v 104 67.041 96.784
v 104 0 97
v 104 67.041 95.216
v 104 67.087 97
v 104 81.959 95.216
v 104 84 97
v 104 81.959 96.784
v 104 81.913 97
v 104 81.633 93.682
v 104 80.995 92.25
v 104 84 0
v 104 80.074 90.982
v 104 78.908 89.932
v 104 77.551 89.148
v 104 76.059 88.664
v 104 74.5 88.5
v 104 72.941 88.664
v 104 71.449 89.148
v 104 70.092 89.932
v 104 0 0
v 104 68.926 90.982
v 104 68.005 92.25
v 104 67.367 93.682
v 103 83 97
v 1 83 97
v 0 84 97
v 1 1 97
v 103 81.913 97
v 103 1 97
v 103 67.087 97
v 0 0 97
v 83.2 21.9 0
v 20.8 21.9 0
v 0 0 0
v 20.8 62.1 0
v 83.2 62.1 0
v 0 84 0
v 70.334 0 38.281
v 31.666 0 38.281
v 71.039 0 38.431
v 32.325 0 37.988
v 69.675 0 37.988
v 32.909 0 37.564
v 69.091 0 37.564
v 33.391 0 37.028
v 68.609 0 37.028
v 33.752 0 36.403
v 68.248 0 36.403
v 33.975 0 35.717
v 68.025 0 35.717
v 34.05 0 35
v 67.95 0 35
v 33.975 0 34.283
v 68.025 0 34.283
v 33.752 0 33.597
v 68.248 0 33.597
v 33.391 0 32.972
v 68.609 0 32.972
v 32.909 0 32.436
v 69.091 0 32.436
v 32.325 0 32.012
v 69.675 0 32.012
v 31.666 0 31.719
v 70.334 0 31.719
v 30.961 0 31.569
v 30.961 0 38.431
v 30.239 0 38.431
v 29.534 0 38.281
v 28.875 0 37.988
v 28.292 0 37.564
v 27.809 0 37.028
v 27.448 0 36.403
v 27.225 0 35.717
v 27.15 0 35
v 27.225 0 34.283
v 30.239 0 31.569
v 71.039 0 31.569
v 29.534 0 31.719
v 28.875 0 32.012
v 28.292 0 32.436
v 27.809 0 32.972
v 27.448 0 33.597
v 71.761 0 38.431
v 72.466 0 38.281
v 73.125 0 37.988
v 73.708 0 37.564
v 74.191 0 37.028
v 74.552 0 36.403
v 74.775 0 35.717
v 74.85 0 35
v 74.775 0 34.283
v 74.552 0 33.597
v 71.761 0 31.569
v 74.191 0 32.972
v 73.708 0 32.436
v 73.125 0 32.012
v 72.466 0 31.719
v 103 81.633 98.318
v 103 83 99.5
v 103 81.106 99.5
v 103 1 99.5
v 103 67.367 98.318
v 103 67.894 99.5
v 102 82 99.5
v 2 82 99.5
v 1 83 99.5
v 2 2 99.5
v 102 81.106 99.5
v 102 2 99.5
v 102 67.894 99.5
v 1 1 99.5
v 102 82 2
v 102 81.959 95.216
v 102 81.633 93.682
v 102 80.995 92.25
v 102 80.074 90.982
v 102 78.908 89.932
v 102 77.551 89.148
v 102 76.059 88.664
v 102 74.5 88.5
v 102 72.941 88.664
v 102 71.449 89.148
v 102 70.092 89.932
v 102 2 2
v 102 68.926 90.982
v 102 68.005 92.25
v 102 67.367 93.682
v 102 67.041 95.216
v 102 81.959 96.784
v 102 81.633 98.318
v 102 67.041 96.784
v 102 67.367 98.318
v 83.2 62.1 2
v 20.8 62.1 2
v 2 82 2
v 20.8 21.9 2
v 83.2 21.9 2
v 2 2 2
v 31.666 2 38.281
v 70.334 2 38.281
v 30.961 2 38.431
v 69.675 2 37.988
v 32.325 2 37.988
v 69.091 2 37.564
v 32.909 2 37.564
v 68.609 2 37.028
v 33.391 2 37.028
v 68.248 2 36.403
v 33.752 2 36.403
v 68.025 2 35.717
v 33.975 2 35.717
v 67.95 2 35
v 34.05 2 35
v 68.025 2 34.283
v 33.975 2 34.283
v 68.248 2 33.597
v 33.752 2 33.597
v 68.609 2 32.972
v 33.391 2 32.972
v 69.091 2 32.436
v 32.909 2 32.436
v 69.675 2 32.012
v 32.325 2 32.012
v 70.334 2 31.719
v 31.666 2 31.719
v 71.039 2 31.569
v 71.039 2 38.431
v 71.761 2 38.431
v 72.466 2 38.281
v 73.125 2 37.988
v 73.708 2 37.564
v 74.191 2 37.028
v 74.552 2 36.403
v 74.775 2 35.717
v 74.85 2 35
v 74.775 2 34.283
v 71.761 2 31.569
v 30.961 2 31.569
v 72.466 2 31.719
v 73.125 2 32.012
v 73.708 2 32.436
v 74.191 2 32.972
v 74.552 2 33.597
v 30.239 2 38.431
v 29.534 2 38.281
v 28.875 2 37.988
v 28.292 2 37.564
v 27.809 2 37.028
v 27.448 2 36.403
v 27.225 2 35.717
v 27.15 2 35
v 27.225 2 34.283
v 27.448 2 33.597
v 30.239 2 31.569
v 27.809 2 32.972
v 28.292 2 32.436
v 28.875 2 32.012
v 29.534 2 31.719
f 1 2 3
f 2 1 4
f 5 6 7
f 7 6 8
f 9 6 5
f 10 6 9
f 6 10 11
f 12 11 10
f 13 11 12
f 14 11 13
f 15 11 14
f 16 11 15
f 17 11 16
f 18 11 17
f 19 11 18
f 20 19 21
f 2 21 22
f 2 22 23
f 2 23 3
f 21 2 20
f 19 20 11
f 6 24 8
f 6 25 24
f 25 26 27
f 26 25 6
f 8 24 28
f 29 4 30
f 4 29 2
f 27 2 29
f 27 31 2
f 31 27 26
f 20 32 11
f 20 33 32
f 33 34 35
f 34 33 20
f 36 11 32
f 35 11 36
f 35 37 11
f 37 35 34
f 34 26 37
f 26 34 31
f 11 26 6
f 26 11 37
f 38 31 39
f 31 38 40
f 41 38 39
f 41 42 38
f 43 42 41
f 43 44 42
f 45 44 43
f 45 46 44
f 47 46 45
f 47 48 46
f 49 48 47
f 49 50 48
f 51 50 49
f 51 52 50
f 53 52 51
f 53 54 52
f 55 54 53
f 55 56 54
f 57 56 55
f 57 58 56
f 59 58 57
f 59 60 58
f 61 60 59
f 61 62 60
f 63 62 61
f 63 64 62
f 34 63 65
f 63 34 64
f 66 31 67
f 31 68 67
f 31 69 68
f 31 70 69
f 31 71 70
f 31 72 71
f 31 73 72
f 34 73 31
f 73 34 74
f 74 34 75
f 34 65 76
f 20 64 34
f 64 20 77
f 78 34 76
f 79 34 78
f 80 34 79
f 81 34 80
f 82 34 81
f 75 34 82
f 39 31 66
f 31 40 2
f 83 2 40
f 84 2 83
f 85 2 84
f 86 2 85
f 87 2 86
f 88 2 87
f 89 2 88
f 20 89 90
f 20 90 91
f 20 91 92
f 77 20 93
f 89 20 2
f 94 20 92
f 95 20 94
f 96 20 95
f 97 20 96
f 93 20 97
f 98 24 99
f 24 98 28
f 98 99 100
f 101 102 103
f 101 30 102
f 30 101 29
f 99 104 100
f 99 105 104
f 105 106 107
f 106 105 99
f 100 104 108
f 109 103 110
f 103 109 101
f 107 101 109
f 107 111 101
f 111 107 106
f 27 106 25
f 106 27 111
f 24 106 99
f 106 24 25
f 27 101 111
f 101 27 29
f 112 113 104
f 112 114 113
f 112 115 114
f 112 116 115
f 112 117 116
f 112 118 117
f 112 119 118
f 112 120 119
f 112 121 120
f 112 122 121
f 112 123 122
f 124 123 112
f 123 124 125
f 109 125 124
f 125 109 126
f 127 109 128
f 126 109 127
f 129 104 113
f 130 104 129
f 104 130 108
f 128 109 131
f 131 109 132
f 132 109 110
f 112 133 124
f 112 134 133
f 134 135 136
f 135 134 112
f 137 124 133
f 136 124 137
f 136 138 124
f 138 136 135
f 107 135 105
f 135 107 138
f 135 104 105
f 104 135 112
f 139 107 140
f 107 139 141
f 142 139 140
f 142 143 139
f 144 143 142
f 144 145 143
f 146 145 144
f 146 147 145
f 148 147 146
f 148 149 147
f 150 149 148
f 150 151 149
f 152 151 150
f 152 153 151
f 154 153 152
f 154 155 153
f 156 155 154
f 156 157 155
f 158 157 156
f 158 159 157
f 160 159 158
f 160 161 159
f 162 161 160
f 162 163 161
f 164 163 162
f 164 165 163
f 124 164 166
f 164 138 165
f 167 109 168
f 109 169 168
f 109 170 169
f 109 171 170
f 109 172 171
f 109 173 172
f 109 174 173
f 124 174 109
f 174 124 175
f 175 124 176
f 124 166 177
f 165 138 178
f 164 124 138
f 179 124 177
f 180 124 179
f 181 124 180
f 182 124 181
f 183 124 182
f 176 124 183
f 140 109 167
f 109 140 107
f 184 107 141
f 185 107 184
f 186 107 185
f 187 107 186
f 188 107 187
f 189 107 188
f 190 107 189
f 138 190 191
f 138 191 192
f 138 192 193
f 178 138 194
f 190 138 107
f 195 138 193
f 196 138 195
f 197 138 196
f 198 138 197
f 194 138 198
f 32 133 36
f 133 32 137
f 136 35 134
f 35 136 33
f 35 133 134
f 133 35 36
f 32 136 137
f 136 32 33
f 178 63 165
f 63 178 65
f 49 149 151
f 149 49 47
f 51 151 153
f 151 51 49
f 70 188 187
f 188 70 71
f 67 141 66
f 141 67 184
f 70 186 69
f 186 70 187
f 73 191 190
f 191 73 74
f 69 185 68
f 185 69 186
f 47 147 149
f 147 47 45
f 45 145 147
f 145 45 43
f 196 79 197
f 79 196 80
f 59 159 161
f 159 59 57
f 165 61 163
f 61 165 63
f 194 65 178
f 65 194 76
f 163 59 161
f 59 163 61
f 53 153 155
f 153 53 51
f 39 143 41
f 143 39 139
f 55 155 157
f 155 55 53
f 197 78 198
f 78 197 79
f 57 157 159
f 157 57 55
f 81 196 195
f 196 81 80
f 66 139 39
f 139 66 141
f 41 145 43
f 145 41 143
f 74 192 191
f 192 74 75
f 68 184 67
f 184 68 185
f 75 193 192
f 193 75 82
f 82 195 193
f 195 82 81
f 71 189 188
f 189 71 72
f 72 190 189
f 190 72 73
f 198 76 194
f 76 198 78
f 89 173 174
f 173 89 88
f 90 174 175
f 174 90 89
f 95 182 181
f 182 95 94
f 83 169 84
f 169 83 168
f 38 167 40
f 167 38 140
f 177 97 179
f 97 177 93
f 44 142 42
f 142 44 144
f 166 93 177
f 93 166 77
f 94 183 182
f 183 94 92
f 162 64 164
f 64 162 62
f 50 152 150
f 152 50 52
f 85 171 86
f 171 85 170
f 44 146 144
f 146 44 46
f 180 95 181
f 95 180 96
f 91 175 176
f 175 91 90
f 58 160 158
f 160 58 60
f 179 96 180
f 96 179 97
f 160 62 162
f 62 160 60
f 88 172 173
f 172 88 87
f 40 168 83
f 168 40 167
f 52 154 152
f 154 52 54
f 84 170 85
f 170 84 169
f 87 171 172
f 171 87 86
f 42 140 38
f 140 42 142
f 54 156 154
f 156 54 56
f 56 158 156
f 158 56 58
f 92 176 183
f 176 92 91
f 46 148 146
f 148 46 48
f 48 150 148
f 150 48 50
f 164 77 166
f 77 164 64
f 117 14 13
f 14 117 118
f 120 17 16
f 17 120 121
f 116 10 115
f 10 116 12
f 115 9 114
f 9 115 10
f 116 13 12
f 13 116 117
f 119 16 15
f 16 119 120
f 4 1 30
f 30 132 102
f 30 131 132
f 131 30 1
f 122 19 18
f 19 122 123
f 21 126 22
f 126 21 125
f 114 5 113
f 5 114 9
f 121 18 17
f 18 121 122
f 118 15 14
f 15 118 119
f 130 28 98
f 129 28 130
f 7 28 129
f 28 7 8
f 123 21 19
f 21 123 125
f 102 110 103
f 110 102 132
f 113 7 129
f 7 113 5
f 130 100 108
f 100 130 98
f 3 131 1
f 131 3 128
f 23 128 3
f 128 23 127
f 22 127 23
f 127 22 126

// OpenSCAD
wallthickness = 1; // this is the wall of the lip, the box is twice as thick
internalx = 100; // internal x dimension
internaly = 80; // internal y dimension
internalz = 100; // internal overall z dimension
internal_lidz=5; // this is taken of off the internalz for the bottom height and acts as the lid internal height
led_x = 62.4;
led_y = 40.2;
cable_hole = 6;
rotary_hole = 6.9/2;

lip_overlap = internal_lidz/2; // how much overlap between box and lid, this works as a default but can be shrunk as needed

lipspacing=0; // this amount is take off of the wall thickness on the lip to increase spacing, if your lid is too tight you can increase this but it will reduce the actual wall thickness on the lip so too much and you will have to increase the wallthickness to compensate. Should be 0 in ideal world, you will likely be better just lightly sanding the lip unless your printer is way out

//#############################
// INTERNAL VARIABLES, DO NOT MODIFY
internal_botz=internalz-internal_lidz;

actual_y=internaly+(4*wallthickness);
actual_x=internalx+(4*wallthickness);
actual_lidz=internal_lidz+(2*wallthickness);
actual_botz=internal_botz+(2*wallthickness);

lip_x = internalx+(2*wallthickness);
lip_y = internaly+(2*wallthickness);


//###########################
module led() {
  cube([led_x, led_y, lip_overlap+.3]);
}

module rotary() {
  cylinder(r = rotary_hole, h = actual_lidz+lip_overlap, $fn = 30);
}

module bottom() {
  difference() {
    union() {
      cube([actual_x,actual_y,actual_botz]);
      translate([wallthickness,wallthickness,actual_botz])
        cube([lip_x,lip_y,lip_overlap]);
    }
    
    translate([(2*wallthickness),(2*wallthickness),(2*wallthickness)])
      cube([internalx,internaly,internalz]);

    translate([(2*wallthickness),(internalz-4*wallthickness),(2*wallthickness)])
      rotate([0,-90,0])
        intersection() {
          translate([15/2,0,0])cube(16, center=true);
          cylinder(r = cable_hole, h = cable_hole, $fn = 30);
        }
    
    #translate([(2*wallthickness+internalx/2-led_x/2),(2*wallthickness+internaly/2-led_y/2),-0.1])
      rotate([0,0,0])
        led();

    translate([lip_x/5*1.5,5,35])
      rotate([90,0,0])
        rotary();
    translate([lip_x/5*3.5,5,35])
      rotate([90,0,0])
        rotary();
        
    // passe cable
    translate([internalx,lip_y-7.5,internaly+wallthickness+2*7.5])
      rotate([0,90,0])
        cylinder(r = 7.5, h = 10, $fn = 30);
  }
}


module lid() {
  difference() {
    cube([actual_x,actual_y,actual_lidz+lip_overlap]);
    
    translate([(2*wallthickness),(2*wallthickness),-.1])
      cube([internalx,internaly,internal_lidz+lip_overlap+.1]);
    
    translate([(wallthickness)-lipspacing/2,(wallthickness)-lipspacing/2,-.1])
      cube([lip_x+lipspacing,lip_y+lipspacing,lip_overlap+.3]);
    
  }
}

*translate([0,0,actual_botz + lip_overlap + 10])lid();
bottom();
*translate([0,0,(lip_overlap + 10)-3])
  rotate([180,0,0])
    lid();
